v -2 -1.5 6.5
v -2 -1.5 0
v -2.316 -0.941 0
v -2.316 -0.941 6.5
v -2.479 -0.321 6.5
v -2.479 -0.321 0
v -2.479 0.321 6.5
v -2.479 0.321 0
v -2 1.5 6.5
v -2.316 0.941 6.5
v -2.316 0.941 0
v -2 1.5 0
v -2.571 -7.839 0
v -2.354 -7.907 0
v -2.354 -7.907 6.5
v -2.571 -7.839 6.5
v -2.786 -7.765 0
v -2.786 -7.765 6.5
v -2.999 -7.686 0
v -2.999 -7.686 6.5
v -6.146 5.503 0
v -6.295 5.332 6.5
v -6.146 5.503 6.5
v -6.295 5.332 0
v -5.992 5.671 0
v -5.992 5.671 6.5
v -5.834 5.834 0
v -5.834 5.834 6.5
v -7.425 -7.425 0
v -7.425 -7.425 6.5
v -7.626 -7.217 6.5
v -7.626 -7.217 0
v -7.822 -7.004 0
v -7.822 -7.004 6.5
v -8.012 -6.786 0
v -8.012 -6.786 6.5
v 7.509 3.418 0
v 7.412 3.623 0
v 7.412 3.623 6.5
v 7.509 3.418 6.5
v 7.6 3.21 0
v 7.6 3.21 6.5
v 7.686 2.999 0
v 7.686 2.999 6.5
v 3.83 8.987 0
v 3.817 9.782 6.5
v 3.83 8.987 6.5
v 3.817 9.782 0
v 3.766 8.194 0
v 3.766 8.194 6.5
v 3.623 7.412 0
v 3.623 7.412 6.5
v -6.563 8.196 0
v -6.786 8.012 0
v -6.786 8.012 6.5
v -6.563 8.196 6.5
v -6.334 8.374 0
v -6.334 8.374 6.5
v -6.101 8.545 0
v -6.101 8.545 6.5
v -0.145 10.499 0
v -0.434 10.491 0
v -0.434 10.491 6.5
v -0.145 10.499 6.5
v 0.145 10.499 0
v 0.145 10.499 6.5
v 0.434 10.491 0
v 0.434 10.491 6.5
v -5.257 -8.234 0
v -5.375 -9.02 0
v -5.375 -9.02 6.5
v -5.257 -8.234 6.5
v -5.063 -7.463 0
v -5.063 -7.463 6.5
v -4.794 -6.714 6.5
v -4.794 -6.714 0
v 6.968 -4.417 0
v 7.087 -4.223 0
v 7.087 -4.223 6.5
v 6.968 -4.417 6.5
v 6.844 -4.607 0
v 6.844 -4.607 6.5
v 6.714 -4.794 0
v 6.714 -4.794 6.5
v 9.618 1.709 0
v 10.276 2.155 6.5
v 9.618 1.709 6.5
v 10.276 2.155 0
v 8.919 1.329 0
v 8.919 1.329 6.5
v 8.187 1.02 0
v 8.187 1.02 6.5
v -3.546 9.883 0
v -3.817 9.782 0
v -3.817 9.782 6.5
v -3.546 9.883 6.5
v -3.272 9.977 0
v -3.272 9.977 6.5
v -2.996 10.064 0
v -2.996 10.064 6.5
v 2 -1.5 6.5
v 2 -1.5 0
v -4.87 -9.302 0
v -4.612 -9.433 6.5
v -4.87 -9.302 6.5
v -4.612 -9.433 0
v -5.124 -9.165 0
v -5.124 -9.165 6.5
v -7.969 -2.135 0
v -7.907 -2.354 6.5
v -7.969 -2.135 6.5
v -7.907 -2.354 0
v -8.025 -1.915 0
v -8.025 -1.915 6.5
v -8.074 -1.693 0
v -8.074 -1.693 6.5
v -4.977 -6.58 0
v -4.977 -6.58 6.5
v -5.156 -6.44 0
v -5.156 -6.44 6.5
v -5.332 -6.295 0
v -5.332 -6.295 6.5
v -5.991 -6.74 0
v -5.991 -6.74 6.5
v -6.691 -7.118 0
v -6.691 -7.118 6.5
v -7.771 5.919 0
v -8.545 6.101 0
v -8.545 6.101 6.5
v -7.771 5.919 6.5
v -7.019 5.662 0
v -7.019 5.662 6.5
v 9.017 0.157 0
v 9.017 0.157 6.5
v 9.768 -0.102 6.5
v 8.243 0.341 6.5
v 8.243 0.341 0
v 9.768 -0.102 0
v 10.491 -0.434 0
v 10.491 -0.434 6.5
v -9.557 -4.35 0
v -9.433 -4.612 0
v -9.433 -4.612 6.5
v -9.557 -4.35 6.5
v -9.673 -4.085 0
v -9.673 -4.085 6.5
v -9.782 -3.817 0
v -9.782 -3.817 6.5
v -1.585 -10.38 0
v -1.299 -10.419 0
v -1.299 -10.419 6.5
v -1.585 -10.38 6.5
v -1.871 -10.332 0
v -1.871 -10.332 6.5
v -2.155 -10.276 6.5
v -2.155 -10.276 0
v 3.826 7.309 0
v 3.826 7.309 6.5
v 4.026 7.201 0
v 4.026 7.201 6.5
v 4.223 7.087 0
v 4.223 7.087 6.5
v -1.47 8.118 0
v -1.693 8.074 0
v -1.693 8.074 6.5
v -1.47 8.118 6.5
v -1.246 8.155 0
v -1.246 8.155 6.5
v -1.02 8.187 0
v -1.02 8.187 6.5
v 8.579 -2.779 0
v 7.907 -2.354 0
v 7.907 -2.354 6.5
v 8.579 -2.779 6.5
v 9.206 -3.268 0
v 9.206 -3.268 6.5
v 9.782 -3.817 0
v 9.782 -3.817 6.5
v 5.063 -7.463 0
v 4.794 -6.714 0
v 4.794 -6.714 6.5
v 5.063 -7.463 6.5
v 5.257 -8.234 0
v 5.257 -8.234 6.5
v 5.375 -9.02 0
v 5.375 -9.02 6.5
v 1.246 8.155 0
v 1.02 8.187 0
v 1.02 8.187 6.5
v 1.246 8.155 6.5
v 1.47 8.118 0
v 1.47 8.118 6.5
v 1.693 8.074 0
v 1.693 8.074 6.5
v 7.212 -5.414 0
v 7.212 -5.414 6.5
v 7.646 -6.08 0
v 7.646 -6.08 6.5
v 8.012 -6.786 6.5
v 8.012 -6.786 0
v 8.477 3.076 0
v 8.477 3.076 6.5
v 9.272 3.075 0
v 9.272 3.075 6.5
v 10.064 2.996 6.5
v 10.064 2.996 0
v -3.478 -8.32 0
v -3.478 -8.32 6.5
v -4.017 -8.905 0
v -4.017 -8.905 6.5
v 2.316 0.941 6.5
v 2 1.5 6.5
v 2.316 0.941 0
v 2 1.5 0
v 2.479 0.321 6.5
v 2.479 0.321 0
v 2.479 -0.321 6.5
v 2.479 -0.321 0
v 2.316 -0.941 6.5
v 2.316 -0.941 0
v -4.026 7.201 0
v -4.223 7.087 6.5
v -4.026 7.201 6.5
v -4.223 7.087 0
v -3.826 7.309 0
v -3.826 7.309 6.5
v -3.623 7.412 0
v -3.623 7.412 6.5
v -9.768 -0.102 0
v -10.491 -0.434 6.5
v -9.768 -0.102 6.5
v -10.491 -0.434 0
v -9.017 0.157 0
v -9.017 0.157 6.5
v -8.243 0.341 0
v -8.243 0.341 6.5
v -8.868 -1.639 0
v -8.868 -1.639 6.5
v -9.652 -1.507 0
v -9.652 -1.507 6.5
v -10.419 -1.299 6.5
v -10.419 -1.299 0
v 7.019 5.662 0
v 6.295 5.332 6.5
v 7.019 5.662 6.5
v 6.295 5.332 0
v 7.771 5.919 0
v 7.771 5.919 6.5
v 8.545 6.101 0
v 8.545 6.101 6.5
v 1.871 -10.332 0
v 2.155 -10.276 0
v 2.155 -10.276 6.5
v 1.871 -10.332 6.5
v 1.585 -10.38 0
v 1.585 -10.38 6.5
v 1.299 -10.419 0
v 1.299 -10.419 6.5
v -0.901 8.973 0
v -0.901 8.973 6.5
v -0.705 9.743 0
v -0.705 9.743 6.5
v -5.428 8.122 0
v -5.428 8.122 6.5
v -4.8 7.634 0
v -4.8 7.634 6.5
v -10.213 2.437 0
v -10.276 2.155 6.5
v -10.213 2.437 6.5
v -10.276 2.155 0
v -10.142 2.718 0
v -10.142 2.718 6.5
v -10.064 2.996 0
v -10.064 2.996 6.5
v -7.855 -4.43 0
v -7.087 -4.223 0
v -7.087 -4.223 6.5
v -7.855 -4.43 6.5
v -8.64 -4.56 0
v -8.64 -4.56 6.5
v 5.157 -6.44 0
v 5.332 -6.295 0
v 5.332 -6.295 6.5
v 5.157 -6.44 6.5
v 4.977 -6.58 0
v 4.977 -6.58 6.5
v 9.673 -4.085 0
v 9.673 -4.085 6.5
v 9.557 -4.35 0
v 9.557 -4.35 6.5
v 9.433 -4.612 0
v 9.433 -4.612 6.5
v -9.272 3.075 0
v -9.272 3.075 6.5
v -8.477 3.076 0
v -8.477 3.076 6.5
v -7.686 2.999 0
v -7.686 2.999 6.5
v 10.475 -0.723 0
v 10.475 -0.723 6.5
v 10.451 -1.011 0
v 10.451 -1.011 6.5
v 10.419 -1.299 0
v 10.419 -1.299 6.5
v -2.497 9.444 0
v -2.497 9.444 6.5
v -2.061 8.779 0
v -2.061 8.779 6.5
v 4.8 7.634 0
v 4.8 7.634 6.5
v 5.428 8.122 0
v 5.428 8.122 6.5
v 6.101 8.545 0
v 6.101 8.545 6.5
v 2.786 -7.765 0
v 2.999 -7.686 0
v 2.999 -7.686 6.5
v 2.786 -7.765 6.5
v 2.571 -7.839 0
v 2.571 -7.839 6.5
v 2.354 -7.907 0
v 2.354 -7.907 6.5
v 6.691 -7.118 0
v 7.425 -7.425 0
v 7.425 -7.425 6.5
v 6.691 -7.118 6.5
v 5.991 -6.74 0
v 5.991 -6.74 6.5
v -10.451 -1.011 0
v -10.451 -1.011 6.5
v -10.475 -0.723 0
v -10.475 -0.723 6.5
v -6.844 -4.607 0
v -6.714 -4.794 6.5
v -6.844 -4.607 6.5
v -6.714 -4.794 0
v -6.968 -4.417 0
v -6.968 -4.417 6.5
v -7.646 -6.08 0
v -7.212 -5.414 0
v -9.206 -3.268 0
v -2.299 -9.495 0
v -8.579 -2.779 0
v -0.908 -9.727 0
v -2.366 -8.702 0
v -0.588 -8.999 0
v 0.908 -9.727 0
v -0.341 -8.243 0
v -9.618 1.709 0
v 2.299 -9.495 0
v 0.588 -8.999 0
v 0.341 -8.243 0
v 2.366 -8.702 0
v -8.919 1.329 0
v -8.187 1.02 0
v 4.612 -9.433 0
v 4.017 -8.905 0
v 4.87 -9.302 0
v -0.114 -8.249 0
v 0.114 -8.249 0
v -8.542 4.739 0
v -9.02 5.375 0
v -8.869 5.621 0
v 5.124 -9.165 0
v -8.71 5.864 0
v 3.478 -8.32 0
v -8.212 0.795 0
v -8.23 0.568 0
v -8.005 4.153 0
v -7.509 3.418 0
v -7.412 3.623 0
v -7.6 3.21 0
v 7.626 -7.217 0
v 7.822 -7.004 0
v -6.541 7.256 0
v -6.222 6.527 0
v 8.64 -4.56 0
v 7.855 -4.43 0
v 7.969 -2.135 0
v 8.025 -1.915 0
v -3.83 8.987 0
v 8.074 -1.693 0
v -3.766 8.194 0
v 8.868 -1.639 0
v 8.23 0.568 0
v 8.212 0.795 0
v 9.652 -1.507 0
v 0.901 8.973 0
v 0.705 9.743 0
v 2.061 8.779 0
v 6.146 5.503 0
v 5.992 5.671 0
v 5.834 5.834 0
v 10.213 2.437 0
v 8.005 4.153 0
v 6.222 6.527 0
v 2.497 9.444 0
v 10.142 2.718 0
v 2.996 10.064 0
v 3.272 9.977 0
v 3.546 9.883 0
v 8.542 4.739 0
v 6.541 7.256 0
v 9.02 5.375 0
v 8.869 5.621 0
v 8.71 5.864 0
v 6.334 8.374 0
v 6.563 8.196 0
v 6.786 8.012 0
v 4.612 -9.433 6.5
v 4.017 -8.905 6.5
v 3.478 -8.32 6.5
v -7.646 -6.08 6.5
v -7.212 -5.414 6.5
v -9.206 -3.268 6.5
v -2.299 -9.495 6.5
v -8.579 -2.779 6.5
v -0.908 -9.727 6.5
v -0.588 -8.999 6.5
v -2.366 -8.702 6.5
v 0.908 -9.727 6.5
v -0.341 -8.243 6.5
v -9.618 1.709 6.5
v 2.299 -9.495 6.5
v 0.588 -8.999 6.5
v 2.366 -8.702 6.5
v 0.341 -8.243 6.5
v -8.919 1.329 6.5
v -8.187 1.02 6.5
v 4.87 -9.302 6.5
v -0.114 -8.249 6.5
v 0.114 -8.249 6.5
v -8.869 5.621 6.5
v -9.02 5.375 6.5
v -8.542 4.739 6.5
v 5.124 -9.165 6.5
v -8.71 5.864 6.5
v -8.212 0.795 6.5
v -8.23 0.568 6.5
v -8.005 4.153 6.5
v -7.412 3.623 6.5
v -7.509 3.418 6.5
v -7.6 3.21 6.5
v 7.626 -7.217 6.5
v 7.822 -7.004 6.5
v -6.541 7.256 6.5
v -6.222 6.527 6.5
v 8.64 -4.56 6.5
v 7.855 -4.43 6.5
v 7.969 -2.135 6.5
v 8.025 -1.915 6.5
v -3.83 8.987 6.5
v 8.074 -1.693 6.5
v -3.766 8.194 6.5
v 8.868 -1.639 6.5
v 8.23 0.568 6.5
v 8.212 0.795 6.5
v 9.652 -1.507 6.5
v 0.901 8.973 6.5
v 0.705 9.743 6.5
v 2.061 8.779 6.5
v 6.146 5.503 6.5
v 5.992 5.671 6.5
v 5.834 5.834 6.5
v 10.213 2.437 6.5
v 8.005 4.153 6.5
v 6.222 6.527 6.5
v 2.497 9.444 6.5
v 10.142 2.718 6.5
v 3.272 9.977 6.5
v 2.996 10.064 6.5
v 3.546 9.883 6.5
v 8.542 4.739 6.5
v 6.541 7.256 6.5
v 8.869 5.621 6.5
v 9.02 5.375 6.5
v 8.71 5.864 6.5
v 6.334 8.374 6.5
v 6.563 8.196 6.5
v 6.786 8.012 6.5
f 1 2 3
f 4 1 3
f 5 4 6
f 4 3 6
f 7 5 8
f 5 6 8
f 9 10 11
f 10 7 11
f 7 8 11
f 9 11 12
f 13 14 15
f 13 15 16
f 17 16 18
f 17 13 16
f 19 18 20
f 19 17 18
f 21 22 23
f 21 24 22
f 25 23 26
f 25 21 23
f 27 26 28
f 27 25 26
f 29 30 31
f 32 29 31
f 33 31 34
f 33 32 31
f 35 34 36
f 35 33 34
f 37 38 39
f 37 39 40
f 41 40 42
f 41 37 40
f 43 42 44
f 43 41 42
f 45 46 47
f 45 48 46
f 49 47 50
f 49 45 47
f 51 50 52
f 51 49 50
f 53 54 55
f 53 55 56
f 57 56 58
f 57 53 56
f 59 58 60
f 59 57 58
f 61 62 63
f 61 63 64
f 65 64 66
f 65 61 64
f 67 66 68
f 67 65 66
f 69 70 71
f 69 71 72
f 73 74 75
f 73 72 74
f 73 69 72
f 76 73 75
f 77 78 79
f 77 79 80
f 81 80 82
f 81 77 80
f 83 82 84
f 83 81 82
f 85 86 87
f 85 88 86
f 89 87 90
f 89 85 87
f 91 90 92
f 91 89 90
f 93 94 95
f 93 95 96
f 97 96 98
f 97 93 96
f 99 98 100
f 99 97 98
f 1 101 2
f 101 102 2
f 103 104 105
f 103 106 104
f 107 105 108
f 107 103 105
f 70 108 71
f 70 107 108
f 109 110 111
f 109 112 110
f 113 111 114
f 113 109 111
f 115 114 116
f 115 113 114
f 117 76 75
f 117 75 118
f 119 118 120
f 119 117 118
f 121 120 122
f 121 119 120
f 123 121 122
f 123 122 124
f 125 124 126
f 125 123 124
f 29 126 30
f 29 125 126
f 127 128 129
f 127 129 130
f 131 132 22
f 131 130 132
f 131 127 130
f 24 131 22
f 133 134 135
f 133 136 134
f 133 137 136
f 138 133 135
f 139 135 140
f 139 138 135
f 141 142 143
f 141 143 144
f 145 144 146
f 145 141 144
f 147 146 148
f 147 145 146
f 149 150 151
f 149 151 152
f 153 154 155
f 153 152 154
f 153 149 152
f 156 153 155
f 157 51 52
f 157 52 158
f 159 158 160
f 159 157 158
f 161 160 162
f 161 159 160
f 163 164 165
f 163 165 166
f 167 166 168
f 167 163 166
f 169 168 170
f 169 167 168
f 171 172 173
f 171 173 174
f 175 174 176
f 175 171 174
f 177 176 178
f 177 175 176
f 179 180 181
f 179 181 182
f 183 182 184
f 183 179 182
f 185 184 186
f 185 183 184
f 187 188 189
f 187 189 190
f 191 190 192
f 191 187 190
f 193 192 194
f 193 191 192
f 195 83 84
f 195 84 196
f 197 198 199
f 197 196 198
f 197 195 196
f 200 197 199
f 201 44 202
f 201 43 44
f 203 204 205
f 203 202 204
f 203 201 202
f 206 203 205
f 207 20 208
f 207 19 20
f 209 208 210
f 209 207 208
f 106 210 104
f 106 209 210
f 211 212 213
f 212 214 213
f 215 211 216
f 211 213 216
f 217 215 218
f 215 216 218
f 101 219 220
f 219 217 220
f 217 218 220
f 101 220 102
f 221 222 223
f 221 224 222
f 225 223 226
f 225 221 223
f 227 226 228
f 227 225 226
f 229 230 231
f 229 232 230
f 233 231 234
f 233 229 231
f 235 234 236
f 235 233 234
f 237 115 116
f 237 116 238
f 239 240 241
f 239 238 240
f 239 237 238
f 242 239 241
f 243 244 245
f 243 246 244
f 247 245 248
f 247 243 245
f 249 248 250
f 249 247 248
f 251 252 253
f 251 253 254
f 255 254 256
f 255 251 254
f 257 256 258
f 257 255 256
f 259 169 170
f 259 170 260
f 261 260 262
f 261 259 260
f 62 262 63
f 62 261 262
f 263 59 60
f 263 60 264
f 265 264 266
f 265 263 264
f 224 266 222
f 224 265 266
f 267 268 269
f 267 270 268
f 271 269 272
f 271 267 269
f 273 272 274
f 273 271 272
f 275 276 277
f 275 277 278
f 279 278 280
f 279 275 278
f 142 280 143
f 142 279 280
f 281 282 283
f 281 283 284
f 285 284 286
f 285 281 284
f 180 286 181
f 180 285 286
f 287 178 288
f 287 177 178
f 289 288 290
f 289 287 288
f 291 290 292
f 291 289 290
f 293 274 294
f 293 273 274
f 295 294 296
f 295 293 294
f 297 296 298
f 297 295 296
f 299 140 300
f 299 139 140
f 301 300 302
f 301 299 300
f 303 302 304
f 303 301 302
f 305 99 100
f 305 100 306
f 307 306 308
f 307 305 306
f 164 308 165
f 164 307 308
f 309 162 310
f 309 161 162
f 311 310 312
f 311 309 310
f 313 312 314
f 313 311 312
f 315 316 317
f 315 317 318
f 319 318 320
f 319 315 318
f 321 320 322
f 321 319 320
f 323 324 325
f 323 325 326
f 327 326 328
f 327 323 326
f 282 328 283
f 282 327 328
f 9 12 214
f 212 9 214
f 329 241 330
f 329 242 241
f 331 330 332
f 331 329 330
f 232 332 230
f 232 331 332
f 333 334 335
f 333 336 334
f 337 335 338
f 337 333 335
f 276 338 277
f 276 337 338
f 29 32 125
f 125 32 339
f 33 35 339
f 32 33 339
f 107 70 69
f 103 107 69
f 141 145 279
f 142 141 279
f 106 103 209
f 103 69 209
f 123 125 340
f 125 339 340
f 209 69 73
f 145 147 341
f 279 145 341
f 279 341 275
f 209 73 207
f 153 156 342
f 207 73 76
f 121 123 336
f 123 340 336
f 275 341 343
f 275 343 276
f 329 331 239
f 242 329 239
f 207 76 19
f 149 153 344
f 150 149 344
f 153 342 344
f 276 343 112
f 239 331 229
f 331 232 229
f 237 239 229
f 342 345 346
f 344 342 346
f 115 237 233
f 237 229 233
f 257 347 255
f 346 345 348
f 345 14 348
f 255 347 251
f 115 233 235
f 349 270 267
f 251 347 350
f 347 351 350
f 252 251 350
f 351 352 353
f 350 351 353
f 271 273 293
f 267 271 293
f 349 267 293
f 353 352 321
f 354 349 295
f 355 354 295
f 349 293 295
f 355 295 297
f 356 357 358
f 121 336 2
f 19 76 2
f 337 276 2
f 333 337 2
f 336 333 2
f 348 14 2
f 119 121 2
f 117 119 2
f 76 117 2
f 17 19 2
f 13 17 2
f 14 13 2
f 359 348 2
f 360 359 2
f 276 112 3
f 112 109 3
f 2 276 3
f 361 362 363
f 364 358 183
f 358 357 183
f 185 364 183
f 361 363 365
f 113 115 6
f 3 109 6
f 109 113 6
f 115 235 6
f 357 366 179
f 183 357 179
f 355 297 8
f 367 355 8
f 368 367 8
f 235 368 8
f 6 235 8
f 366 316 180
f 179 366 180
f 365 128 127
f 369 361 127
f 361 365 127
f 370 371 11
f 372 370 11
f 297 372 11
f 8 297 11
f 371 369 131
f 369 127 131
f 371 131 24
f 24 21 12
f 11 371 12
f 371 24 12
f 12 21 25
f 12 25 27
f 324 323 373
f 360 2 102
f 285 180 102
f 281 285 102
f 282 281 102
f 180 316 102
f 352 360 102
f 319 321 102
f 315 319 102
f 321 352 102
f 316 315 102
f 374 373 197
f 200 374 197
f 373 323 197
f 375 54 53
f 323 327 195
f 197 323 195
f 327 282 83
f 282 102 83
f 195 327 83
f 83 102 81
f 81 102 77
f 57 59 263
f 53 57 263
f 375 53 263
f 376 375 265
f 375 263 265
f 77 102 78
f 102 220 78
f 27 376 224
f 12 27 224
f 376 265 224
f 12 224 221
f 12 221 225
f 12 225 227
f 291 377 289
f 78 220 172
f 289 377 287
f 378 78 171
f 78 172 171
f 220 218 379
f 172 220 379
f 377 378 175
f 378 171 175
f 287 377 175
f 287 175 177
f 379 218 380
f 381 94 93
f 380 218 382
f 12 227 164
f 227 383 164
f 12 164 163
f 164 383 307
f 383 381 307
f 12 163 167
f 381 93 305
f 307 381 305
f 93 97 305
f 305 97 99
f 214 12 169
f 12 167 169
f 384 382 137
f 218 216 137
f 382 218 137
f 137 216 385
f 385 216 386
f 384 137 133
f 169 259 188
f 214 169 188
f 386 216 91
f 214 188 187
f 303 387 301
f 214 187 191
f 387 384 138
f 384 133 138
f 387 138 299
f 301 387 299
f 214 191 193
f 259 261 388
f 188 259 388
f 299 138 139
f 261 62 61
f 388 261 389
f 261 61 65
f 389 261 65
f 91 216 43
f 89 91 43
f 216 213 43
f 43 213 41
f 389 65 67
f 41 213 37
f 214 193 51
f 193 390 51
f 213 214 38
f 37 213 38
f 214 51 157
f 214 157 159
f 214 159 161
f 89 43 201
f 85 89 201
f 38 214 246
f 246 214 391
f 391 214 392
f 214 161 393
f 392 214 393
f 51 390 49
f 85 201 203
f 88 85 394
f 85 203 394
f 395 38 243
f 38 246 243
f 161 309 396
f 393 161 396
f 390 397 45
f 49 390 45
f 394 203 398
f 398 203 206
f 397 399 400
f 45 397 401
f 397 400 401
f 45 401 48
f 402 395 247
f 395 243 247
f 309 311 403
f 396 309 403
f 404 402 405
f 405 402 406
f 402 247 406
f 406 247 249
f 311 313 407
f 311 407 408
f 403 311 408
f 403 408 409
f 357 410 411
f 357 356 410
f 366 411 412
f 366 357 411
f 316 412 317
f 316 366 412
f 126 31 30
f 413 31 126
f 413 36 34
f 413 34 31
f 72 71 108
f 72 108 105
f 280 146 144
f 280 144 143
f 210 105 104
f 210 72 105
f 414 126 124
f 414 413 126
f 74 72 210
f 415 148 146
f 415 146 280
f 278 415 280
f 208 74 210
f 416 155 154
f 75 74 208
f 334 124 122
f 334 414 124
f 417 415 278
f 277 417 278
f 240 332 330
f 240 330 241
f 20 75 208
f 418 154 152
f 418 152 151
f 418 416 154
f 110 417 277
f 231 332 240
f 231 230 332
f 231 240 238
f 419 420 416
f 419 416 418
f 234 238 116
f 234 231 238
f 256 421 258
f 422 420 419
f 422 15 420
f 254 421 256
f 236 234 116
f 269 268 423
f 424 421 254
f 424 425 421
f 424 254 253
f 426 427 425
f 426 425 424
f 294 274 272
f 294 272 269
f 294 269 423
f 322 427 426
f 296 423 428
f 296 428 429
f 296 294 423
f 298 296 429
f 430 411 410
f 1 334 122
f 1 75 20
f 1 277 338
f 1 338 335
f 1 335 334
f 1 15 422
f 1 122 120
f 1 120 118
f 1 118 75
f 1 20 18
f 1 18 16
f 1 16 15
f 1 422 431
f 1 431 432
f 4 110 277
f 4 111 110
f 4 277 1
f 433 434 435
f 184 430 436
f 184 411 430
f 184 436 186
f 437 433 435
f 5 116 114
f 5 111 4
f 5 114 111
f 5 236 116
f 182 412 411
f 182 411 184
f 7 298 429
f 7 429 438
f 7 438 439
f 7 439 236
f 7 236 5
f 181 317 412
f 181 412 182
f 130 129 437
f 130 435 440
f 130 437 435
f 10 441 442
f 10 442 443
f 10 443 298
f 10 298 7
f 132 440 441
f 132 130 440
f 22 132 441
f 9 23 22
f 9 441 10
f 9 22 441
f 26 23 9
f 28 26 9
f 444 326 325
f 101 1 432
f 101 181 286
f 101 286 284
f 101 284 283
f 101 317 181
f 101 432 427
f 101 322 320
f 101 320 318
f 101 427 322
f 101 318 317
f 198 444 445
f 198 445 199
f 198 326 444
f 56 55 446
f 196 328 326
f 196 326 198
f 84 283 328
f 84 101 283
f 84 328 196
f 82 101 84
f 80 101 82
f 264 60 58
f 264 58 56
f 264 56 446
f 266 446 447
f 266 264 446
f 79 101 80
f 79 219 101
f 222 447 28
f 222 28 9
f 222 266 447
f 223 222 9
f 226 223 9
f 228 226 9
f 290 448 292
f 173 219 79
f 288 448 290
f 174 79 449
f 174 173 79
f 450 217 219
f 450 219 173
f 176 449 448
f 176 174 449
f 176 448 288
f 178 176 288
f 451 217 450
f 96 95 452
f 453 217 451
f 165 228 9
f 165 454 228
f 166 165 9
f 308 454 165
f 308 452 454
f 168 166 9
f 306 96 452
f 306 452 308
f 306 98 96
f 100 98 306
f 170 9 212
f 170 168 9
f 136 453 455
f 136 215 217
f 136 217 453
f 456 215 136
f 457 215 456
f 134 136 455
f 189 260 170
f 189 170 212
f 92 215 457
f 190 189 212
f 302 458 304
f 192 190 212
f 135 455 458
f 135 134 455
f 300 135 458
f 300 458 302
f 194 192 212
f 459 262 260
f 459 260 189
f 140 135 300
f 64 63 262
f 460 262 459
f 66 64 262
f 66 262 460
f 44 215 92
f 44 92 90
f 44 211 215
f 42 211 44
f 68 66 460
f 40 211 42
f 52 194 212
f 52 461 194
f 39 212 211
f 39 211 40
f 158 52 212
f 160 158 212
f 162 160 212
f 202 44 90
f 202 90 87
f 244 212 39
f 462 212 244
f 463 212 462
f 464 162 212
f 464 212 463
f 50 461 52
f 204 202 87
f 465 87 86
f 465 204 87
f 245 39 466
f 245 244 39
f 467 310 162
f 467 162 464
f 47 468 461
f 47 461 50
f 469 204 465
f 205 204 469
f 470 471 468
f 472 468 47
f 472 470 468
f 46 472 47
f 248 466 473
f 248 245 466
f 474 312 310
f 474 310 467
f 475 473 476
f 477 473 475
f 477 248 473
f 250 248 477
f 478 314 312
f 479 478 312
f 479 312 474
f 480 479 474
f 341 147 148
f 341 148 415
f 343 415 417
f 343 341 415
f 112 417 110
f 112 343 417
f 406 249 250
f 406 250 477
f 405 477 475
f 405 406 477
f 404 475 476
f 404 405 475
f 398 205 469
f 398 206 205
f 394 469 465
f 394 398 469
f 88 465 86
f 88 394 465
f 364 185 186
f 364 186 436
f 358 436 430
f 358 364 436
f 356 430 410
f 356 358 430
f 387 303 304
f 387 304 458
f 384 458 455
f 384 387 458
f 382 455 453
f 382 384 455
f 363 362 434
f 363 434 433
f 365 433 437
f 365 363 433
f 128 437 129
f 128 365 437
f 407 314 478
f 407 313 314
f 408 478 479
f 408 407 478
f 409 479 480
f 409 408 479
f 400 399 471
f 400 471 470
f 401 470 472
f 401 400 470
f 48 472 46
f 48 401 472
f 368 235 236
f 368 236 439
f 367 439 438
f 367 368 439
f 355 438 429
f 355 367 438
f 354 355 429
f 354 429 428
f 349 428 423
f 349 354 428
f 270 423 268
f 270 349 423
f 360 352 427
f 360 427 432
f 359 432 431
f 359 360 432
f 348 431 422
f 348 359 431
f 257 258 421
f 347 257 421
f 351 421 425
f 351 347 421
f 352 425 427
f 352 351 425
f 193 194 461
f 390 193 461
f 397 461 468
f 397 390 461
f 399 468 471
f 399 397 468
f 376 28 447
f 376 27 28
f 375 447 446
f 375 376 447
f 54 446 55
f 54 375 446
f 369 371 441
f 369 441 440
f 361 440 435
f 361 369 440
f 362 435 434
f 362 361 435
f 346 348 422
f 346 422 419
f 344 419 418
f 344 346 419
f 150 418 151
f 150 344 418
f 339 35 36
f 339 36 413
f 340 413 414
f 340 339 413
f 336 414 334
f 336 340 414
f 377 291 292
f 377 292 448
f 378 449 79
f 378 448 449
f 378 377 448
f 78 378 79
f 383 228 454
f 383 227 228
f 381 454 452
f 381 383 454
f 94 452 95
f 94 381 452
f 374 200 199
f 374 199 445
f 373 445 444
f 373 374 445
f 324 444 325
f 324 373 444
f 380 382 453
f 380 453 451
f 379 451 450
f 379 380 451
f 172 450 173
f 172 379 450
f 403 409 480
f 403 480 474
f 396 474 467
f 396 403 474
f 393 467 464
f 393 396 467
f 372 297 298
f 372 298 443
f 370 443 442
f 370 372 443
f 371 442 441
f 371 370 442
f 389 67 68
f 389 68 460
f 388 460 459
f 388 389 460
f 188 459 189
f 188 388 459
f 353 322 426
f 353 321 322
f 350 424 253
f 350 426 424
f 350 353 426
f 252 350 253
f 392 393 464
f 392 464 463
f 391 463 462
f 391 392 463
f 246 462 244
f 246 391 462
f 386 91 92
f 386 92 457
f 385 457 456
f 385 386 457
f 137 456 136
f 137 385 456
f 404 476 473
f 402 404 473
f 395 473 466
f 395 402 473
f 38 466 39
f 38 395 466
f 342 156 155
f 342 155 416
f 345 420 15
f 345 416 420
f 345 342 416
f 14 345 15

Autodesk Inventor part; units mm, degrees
ref_plane "YZ Plane" through (0, 0, 0) normal (1, 0, 0) x (0, 1, 0)
ref_plane "XZ Plane" through (0, 0, 0) normal (0, 1, 0) x (-1, 0, 0)
ref_plane "XY Plane" through (0, 0, 0) normal (0, 0, 1) x (1, 0, 0)
sketch "スケッチ1" plane through (0, 0, 0) normal (0, 0, 1) x (1, 0, 0)
  arc A0 (-3.8168, 9.7817) -> (-3.6234, 7.4117) centre (4.2362, 9.2462) ccw
  arc A1 (-3.6234, 7.4117) -> (-4.2231, 7.0872) centre (0, 0) ccw
  arc A2 (-4.2231, 7.0872) -> (-6.1013, 8.5454) centre (-10.0576, 1.5108) ccw
  arc A3 (-6.1013, 8.5454) -> (-6.7861, 8.0124) centre (0, 0) ccw
  arc A4 (-6.7861, 8.0124) -> (-5.8336, 5.8336) centre (1.0044, 10.1207) ccw
  arc A5 (-5.8336, 5.8336) -> (-6.2954, 5.332) centre (0, 0) ccw
  arc A6 (-6.2954, 5.332) -> (-8.5454, 6.1013) centre (-10.0032, -1.8368) ccw
  arc A7 (-8.5454, 6.1013) -> (-9.0201, 5.3748) centre (0, 0) ccw
  arc A8 (-9.0201, 5.3748) -> (-7.4117, 3.6234) centre (-2.3362, 9.8985) ccw
  arc A9 (-7.4117, 3.6234) -> (-7.6856, 2.9989) centre (0, 0) ccw
  arc A10 (-7.6856, 2.9989) -> (-10.0635, 2.996) centre (-8.8648, -4.9853) ccw
  arc A11 (-10.0635, 2.996) -> (-10.2765, 2.1548) centre (0, 0) ccw
  arc A12 (-10.2765, 2.1548) -> (-8.1866, 1.0205) centre (-5.4236, 8.6036) ccw
  arc A13 (-8.1866, 1.0205) -> (-8.243, 0.3409) centre (0, 0) ccw
  arc A14 (-8.243, 0.3409) -> (-10.491, -0.4339) centre (-6.7658, -7.5935) ccw
  arc A15 (-10.491, -0.4339) -> (-10.4194, -1.2988) centre (0, 0) ccw
  arc A16 (-10.4194, -1.2988) -> (-8.0744, -1.693) centre (-7.9233, 6.3764) ccw
  arc A17 (-8.0744, -1.693) -> (-7.907, -2.354) centre (0, 0) ccw
  arc A18 (-7.907, -2.354) -> (-9.7817, -3.8168) centre (-3.9336, -9.3789) ccw
  arc A19 (-9.7817, -3.8168) -> (-9.4331, -4.6116) centre (0, 0) ccw
  arc A20 (-9.4331, -4.6116) -> (-7.0872, -4.2231) centre (-9.5644, 3.4582) ccw
  arc A21 (-7.0872, -4.2231) -> (-6.7143, -4.7939) centre (0, 0) ccw
  arc A22 (-6.7143, -4.7939) -> (-8.0124, -6.7861) centre (-0.6751, -10.148) ccw
  arc A23 (-8.0124, -6.7861) -> (-7.4246, -7.4246) centre (0, 0) ccw
  arc A24 (-7.4246, -7.4246) -> (-5.332, -6.2954) centre (-10.1691, 0.1652) ccw
  arc A25 (-5.332, -6.2954) -> (-4.7939, -6.7143) centre (0, 0) ccw
  arc A26 (-4.7939, -6.7143) -> (-5.3748, -9.0201) centre (2.6565, -9.8173) ccw
  arc A27 (-5.3748, -9.0201) -> (-4.6116, -9.4331) centre (0, 0) ccw
  arc A28 (-4.6116, -9.4331) -> (-2.9989, -7.6856) centre (-9.6717, -3.1456) ccw
  arc A29 (-2.9989, -7.6856) -> (-2.354, -7.907) centre (0, 0) ccw
  arc A30 (-2.354, -7.907) -> (-2.1548, -10.2765) centre (5.7003, -8.4228) ccw
  arc A31 (-2.1548, -10.2765) -> (-1.2988, -10.4194) centre (0, 0) ccw
  arc A32 (-1.2988, -10.4194) -> (-0.3409, -8.243) centre (-8.1263, -6.1156) ccw
  arc A33 (-0.3409, -8.243) -> (0.3409, -8.243) centre (0, 0) ccw
  arc A34 (0.3409, -8.243) -> (1.2988, -10.4194) centre (8.1263, -6.1156) ccw
  arc A35 (1.2988, -10.4194) -> (2.1548, -10.2765) centre (0, 0) ccw
  arc A36 (2.1548, -10.2765) -> (2.354, -7.907) centre (-5.7003, -8.4228) ccw
  arc A37 (2.354, -7.907) -> (2.9989, -7.6856) centre (0, 0) ccw
  arc A38 (2.9989, -7.6856) -> (4.6116, -9.4331) centre (9.6717, -3.1456) ccw
  arc A39 (4.6116, -9.4331) -> (5.3748, -9.0201) centre (0, 0) ccw
  arc A40 (5.3748, -9.0201) -> (4.7939, -6.7143) centre (-2.6565, -9.8173) ccw
  arc A41 (4.7939, -6.7143) -> (5.332, -6.2954) centre (0, 0) ccw
  arc A42 (5.332, -6.2954) -> (7.4246, -7.4246) centre (10.1691, 0.1652) ccw
  arc A43 (7.4246, -7.4246) -> (8.0124, -6.7861) centre (0, 0) ccw
  arc A44 (8.0124, -6.7861) -> (6.7143, -4.7939) centre (0.6751, -10.148) ccw
  arc A45 (6.7143, -4.7939) -> (7.0872, -4.2231) centre (0, 0) ccw
  arc A46 (7.0872, -4.2231) -> (9.4331, -4.6116) centre (9.5644, 3.4582) ccw
  arc A47 (9.4331, -4.6116) -> (9.7817, -3.8168) centre (0, 0) ccw
  arc A48 (9.7817, -3.8168) -> (7.907, -2.354) centre (3.9336, -9.3789) ccw
  arc A49 (7.907, -2.354) -> (8.0744, -1.693) centre (0, 0) ccw
  arc A50 (8.0744, -1.693) -> (10.4194, -1.2988) centre (7.9233, 6.3764) ccw
  arc A51 (10.4194, -1.2988) -> (10.491, -0.4339) centre (0, 0) ccw
  arc A52 (10.491, -0.4339) -> (8.243, 0.3409) centre (6.7658, -7.5935) ccw
  arc A53 (8.243, 0.3409) -> (8.1866, 1.0205) centre (0, 0) ccw
  arc A54 (8.1866, 1.0205) -> (10.2765, 2.1548) centre (5.4236, 8.6036) ccw
  arc A55 (10.2765, 2.1548) -> (10.0635, 2.996) centre (0, 0) ccw
  arc A56 (10.0635, 2.996) -> (7.6856, 2.9989) centre (8.8648, -4.9853) ccw
  arc A57 (7.6856, 2.9989) -> (7.4117, 3.6234) centre (0, 0) ccw
  arc A58 (7.4117, 3.6234) -> (9.0201, 5.3748) centre (2.3362, 9.8985) ccw
  arc A59 (9.0201, 5.3748) -> (8.5454, 6.1013) centre (0, 0) ccw
  arc A60 (8.5454, 6.1013) -> (6.2954, 5.332) centre (10.0032, -1.8368) ccw
  arc A61 (6.2954, 5.332) -> (5.8336, 5.8336) centre (0, 0) ccw
  arc A62 (5.8336, 5.8336) -> (6.7861, 8.0124) centre (-1.0044, 10.1207) ccw
  arc A63 (6.7861, 8.0124) -> (6.1013, 8.5454) centre (0, 0) ccw
  arc A64 (6.1013, 8.5454) -> (4.2231, 7.0872) centre (10.0576, 1.5108) ccw
  arc A65 (4.2231, 7.0872) -> (3.6234, 7.4117) centre (0, 0) ccw
  arc A66 (3.6234, 7.4117) -> (3.8168, 9.7817) centre (-4.2362, 9.2462) ccw
  arc A67 (3.8168, 9.7817) -> (2.996, 10.0635) centre (0, 0) ccw
  arc A68 (2.996, 10.0635) -> (1.693, 8.0744) centre (9.0221, 4.6946) ccw
  arc A69 (1.693, 8.0744) -> (1.0205, 8.1866) centre (0, 0) ccw
  arc A70 (1.0205, 8.1866) -> (0.4339, 10.491) centre (-7.0089, 7.3697) ccw
  arc A71 (0.4339, 10.491) -> (-0.4339, 10.491) centre (0, 0) ccw
  arc A72 (-0.4339, 10.491) -> (-1.0205, 8.1866) centre (7.0089, 7.3697) ccw
  arc A73 (-1.0205, 8.1866) -> (-1.693, 8.0744) centre (0, 0) ccw
  arc A74 (-1.693, 8.0744) -> (-2.996, 10.0635) centre (-9.0221, 4.6946) ccw
  arc A75 (-2.996, 10.0635) -> (-3.8168, 9.7817) centre (0, 0) ccw
  line L0 (-2, 1.5) -> (2, 1.5)
  line L1 (2, -1.5) -> (-2, -1.5)
  arc A76 (2, -1.5) -> (2, 1.5) centre (0, 0) ccw
  arc A77 (-2, 1.5) -> (-2, -1.5) centre (0, 0) ccw
  point P0 (0, 0)
  point P1 (0, 0)
  point P2 (0, 0)
  point P3 (0, 0)
  point P4 (0, 0)
  point P5 (0, 0)
  point P6 (0, 0)
  point P7 (0, 0)
  point P8 (0, 0)
  point P9 (0, 0)
  point P10 (0, 0)
  point P11 (0, 0)
  point P12 (0, 0)
  point P13 (0, 0)
  point P14 (0, 0)
  point P15 (0, 0)
  point P16 (0, 0)
  point P17 (0, 0)
  point P18 (0, 0)
  point P19 (0, 0)
  point P20 (0, 0)
  point P21 (0, 0)
  point P22 (0, 0)
  point P23 (0, 0)
  point P24 (0, 0)
  point P25 (0, 0)
  point P26 (0, 0)
  point P27 (0, 0)
  point P28 (0, 0)
  point P29 (0, 0)
  point P30 (0, 0)
  point P31 (0, 0)
  point P32 (0, 0)
  point P33 (0, 0)
  point P34 (0, 0)
extrude "押し出し1" add sketch "スケッチ1" along normal blind 6.5
properties part number "Gear19"
